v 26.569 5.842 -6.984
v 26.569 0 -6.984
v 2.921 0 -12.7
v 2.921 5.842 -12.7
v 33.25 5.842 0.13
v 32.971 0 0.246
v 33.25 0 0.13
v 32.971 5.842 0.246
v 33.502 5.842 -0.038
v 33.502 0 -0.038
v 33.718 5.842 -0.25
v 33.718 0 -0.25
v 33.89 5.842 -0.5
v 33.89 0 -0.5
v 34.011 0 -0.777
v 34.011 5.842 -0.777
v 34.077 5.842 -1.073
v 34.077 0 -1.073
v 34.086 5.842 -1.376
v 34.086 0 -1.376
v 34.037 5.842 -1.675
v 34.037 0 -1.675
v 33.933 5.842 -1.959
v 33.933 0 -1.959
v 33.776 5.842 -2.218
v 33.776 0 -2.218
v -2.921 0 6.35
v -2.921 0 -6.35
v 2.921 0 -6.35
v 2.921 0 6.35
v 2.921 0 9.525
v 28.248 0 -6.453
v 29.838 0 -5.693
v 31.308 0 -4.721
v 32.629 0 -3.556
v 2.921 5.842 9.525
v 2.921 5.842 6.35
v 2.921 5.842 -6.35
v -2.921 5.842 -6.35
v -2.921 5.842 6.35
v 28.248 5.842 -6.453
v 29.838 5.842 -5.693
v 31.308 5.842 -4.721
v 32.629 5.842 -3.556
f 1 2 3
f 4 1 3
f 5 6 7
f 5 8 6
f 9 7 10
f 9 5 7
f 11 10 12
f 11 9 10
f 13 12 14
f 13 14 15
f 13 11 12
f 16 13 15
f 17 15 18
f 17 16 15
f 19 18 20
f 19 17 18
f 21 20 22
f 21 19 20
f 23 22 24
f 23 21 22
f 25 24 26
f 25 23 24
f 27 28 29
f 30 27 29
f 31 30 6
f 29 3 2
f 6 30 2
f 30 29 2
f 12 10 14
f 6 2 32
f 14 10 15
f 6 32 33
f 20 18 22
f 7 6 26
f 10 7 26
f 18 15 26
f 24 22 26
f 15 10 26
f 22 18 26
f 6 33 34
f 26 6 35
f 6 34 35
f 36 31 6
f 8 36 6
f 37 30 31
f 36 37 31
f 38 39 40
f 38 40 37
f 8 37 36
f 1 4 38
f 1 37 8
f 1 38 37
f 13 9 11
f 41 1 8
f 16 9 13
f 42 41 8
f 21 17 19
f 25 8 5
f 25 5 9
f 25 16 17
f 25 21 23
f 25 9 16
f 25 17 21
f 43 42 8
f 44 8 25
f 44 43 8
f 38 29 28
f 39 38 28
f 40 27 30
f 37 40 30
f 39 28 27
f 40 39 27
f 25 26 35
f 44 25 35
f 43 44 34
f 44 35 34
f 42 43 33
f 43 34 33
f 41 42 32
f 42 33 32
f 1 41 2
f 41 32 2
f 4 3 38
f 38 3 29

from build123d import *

# Parameters (mm, degrees)
BOSS_EXTRUDE1_DEPTH = 5.842
FILLET1_R           = 12.7
FILLET2_R           = 1.5875


with BuildPart() as part:
    # Sketch1 → Boss-Extrude1 (new body)
    with BuildSketch(Plane(origin=(0, 0, 0), x_dir=(1, 0, 0), z_dir=(0, 1, 0))):
        Polygon((34.925, 0.357309717), (34.925, 4.964553254), (2.921, 12.7), (2.921, 6.35), (-2.921, 6.35), (-2.921, -6.35), (2.921, -6.35), (2.921, -9.525), align=None)
    extrude(amount=BOSS_EXTRUDE1_DEPTH)

    # Fillet1
    # the kernel refuses this fillet: 12.7 mm, written as the material it takes off along each edge
    with BuildSketch(Plane(origin=(34.925, -21.492812716, -4.964553254), x_dir=(0, 0, 1), z_dir=(0, 1, 0))) as fillet1_piece_1:
        with BuildLine():
            CenterArc((10.324747541, -11.340200526), FILLET1_R, 116.756334597, 49.655734511)
            Line((-2.019785945, -8.356495946), (-2.266676614, -8.296821854))
            Line((-2.266676614, -8.296821854), (-0.24689067, 0.059674092))
            Line((-0.24689067, 0.059674092), (0, 0.254))
            ThreePointArc((0, 0.254), (2.303621769, 0.254), (4.492893457, 0.226804011))
            Line((4.492893457, 0.226804011), (4.607243537, 0))
        make_face()
    extrude(amount=48.827625432, mode=Mode.SUBTRACT)

    # Fillet2
    fillet2_edges = [part.edges().sort_by_distance(p)[0] for p in [
        (34.925, 2.921, -0.357309717),
    ]]
    fillet(fillet2_edges, radius=FILLET2_R)


solid = part.part
